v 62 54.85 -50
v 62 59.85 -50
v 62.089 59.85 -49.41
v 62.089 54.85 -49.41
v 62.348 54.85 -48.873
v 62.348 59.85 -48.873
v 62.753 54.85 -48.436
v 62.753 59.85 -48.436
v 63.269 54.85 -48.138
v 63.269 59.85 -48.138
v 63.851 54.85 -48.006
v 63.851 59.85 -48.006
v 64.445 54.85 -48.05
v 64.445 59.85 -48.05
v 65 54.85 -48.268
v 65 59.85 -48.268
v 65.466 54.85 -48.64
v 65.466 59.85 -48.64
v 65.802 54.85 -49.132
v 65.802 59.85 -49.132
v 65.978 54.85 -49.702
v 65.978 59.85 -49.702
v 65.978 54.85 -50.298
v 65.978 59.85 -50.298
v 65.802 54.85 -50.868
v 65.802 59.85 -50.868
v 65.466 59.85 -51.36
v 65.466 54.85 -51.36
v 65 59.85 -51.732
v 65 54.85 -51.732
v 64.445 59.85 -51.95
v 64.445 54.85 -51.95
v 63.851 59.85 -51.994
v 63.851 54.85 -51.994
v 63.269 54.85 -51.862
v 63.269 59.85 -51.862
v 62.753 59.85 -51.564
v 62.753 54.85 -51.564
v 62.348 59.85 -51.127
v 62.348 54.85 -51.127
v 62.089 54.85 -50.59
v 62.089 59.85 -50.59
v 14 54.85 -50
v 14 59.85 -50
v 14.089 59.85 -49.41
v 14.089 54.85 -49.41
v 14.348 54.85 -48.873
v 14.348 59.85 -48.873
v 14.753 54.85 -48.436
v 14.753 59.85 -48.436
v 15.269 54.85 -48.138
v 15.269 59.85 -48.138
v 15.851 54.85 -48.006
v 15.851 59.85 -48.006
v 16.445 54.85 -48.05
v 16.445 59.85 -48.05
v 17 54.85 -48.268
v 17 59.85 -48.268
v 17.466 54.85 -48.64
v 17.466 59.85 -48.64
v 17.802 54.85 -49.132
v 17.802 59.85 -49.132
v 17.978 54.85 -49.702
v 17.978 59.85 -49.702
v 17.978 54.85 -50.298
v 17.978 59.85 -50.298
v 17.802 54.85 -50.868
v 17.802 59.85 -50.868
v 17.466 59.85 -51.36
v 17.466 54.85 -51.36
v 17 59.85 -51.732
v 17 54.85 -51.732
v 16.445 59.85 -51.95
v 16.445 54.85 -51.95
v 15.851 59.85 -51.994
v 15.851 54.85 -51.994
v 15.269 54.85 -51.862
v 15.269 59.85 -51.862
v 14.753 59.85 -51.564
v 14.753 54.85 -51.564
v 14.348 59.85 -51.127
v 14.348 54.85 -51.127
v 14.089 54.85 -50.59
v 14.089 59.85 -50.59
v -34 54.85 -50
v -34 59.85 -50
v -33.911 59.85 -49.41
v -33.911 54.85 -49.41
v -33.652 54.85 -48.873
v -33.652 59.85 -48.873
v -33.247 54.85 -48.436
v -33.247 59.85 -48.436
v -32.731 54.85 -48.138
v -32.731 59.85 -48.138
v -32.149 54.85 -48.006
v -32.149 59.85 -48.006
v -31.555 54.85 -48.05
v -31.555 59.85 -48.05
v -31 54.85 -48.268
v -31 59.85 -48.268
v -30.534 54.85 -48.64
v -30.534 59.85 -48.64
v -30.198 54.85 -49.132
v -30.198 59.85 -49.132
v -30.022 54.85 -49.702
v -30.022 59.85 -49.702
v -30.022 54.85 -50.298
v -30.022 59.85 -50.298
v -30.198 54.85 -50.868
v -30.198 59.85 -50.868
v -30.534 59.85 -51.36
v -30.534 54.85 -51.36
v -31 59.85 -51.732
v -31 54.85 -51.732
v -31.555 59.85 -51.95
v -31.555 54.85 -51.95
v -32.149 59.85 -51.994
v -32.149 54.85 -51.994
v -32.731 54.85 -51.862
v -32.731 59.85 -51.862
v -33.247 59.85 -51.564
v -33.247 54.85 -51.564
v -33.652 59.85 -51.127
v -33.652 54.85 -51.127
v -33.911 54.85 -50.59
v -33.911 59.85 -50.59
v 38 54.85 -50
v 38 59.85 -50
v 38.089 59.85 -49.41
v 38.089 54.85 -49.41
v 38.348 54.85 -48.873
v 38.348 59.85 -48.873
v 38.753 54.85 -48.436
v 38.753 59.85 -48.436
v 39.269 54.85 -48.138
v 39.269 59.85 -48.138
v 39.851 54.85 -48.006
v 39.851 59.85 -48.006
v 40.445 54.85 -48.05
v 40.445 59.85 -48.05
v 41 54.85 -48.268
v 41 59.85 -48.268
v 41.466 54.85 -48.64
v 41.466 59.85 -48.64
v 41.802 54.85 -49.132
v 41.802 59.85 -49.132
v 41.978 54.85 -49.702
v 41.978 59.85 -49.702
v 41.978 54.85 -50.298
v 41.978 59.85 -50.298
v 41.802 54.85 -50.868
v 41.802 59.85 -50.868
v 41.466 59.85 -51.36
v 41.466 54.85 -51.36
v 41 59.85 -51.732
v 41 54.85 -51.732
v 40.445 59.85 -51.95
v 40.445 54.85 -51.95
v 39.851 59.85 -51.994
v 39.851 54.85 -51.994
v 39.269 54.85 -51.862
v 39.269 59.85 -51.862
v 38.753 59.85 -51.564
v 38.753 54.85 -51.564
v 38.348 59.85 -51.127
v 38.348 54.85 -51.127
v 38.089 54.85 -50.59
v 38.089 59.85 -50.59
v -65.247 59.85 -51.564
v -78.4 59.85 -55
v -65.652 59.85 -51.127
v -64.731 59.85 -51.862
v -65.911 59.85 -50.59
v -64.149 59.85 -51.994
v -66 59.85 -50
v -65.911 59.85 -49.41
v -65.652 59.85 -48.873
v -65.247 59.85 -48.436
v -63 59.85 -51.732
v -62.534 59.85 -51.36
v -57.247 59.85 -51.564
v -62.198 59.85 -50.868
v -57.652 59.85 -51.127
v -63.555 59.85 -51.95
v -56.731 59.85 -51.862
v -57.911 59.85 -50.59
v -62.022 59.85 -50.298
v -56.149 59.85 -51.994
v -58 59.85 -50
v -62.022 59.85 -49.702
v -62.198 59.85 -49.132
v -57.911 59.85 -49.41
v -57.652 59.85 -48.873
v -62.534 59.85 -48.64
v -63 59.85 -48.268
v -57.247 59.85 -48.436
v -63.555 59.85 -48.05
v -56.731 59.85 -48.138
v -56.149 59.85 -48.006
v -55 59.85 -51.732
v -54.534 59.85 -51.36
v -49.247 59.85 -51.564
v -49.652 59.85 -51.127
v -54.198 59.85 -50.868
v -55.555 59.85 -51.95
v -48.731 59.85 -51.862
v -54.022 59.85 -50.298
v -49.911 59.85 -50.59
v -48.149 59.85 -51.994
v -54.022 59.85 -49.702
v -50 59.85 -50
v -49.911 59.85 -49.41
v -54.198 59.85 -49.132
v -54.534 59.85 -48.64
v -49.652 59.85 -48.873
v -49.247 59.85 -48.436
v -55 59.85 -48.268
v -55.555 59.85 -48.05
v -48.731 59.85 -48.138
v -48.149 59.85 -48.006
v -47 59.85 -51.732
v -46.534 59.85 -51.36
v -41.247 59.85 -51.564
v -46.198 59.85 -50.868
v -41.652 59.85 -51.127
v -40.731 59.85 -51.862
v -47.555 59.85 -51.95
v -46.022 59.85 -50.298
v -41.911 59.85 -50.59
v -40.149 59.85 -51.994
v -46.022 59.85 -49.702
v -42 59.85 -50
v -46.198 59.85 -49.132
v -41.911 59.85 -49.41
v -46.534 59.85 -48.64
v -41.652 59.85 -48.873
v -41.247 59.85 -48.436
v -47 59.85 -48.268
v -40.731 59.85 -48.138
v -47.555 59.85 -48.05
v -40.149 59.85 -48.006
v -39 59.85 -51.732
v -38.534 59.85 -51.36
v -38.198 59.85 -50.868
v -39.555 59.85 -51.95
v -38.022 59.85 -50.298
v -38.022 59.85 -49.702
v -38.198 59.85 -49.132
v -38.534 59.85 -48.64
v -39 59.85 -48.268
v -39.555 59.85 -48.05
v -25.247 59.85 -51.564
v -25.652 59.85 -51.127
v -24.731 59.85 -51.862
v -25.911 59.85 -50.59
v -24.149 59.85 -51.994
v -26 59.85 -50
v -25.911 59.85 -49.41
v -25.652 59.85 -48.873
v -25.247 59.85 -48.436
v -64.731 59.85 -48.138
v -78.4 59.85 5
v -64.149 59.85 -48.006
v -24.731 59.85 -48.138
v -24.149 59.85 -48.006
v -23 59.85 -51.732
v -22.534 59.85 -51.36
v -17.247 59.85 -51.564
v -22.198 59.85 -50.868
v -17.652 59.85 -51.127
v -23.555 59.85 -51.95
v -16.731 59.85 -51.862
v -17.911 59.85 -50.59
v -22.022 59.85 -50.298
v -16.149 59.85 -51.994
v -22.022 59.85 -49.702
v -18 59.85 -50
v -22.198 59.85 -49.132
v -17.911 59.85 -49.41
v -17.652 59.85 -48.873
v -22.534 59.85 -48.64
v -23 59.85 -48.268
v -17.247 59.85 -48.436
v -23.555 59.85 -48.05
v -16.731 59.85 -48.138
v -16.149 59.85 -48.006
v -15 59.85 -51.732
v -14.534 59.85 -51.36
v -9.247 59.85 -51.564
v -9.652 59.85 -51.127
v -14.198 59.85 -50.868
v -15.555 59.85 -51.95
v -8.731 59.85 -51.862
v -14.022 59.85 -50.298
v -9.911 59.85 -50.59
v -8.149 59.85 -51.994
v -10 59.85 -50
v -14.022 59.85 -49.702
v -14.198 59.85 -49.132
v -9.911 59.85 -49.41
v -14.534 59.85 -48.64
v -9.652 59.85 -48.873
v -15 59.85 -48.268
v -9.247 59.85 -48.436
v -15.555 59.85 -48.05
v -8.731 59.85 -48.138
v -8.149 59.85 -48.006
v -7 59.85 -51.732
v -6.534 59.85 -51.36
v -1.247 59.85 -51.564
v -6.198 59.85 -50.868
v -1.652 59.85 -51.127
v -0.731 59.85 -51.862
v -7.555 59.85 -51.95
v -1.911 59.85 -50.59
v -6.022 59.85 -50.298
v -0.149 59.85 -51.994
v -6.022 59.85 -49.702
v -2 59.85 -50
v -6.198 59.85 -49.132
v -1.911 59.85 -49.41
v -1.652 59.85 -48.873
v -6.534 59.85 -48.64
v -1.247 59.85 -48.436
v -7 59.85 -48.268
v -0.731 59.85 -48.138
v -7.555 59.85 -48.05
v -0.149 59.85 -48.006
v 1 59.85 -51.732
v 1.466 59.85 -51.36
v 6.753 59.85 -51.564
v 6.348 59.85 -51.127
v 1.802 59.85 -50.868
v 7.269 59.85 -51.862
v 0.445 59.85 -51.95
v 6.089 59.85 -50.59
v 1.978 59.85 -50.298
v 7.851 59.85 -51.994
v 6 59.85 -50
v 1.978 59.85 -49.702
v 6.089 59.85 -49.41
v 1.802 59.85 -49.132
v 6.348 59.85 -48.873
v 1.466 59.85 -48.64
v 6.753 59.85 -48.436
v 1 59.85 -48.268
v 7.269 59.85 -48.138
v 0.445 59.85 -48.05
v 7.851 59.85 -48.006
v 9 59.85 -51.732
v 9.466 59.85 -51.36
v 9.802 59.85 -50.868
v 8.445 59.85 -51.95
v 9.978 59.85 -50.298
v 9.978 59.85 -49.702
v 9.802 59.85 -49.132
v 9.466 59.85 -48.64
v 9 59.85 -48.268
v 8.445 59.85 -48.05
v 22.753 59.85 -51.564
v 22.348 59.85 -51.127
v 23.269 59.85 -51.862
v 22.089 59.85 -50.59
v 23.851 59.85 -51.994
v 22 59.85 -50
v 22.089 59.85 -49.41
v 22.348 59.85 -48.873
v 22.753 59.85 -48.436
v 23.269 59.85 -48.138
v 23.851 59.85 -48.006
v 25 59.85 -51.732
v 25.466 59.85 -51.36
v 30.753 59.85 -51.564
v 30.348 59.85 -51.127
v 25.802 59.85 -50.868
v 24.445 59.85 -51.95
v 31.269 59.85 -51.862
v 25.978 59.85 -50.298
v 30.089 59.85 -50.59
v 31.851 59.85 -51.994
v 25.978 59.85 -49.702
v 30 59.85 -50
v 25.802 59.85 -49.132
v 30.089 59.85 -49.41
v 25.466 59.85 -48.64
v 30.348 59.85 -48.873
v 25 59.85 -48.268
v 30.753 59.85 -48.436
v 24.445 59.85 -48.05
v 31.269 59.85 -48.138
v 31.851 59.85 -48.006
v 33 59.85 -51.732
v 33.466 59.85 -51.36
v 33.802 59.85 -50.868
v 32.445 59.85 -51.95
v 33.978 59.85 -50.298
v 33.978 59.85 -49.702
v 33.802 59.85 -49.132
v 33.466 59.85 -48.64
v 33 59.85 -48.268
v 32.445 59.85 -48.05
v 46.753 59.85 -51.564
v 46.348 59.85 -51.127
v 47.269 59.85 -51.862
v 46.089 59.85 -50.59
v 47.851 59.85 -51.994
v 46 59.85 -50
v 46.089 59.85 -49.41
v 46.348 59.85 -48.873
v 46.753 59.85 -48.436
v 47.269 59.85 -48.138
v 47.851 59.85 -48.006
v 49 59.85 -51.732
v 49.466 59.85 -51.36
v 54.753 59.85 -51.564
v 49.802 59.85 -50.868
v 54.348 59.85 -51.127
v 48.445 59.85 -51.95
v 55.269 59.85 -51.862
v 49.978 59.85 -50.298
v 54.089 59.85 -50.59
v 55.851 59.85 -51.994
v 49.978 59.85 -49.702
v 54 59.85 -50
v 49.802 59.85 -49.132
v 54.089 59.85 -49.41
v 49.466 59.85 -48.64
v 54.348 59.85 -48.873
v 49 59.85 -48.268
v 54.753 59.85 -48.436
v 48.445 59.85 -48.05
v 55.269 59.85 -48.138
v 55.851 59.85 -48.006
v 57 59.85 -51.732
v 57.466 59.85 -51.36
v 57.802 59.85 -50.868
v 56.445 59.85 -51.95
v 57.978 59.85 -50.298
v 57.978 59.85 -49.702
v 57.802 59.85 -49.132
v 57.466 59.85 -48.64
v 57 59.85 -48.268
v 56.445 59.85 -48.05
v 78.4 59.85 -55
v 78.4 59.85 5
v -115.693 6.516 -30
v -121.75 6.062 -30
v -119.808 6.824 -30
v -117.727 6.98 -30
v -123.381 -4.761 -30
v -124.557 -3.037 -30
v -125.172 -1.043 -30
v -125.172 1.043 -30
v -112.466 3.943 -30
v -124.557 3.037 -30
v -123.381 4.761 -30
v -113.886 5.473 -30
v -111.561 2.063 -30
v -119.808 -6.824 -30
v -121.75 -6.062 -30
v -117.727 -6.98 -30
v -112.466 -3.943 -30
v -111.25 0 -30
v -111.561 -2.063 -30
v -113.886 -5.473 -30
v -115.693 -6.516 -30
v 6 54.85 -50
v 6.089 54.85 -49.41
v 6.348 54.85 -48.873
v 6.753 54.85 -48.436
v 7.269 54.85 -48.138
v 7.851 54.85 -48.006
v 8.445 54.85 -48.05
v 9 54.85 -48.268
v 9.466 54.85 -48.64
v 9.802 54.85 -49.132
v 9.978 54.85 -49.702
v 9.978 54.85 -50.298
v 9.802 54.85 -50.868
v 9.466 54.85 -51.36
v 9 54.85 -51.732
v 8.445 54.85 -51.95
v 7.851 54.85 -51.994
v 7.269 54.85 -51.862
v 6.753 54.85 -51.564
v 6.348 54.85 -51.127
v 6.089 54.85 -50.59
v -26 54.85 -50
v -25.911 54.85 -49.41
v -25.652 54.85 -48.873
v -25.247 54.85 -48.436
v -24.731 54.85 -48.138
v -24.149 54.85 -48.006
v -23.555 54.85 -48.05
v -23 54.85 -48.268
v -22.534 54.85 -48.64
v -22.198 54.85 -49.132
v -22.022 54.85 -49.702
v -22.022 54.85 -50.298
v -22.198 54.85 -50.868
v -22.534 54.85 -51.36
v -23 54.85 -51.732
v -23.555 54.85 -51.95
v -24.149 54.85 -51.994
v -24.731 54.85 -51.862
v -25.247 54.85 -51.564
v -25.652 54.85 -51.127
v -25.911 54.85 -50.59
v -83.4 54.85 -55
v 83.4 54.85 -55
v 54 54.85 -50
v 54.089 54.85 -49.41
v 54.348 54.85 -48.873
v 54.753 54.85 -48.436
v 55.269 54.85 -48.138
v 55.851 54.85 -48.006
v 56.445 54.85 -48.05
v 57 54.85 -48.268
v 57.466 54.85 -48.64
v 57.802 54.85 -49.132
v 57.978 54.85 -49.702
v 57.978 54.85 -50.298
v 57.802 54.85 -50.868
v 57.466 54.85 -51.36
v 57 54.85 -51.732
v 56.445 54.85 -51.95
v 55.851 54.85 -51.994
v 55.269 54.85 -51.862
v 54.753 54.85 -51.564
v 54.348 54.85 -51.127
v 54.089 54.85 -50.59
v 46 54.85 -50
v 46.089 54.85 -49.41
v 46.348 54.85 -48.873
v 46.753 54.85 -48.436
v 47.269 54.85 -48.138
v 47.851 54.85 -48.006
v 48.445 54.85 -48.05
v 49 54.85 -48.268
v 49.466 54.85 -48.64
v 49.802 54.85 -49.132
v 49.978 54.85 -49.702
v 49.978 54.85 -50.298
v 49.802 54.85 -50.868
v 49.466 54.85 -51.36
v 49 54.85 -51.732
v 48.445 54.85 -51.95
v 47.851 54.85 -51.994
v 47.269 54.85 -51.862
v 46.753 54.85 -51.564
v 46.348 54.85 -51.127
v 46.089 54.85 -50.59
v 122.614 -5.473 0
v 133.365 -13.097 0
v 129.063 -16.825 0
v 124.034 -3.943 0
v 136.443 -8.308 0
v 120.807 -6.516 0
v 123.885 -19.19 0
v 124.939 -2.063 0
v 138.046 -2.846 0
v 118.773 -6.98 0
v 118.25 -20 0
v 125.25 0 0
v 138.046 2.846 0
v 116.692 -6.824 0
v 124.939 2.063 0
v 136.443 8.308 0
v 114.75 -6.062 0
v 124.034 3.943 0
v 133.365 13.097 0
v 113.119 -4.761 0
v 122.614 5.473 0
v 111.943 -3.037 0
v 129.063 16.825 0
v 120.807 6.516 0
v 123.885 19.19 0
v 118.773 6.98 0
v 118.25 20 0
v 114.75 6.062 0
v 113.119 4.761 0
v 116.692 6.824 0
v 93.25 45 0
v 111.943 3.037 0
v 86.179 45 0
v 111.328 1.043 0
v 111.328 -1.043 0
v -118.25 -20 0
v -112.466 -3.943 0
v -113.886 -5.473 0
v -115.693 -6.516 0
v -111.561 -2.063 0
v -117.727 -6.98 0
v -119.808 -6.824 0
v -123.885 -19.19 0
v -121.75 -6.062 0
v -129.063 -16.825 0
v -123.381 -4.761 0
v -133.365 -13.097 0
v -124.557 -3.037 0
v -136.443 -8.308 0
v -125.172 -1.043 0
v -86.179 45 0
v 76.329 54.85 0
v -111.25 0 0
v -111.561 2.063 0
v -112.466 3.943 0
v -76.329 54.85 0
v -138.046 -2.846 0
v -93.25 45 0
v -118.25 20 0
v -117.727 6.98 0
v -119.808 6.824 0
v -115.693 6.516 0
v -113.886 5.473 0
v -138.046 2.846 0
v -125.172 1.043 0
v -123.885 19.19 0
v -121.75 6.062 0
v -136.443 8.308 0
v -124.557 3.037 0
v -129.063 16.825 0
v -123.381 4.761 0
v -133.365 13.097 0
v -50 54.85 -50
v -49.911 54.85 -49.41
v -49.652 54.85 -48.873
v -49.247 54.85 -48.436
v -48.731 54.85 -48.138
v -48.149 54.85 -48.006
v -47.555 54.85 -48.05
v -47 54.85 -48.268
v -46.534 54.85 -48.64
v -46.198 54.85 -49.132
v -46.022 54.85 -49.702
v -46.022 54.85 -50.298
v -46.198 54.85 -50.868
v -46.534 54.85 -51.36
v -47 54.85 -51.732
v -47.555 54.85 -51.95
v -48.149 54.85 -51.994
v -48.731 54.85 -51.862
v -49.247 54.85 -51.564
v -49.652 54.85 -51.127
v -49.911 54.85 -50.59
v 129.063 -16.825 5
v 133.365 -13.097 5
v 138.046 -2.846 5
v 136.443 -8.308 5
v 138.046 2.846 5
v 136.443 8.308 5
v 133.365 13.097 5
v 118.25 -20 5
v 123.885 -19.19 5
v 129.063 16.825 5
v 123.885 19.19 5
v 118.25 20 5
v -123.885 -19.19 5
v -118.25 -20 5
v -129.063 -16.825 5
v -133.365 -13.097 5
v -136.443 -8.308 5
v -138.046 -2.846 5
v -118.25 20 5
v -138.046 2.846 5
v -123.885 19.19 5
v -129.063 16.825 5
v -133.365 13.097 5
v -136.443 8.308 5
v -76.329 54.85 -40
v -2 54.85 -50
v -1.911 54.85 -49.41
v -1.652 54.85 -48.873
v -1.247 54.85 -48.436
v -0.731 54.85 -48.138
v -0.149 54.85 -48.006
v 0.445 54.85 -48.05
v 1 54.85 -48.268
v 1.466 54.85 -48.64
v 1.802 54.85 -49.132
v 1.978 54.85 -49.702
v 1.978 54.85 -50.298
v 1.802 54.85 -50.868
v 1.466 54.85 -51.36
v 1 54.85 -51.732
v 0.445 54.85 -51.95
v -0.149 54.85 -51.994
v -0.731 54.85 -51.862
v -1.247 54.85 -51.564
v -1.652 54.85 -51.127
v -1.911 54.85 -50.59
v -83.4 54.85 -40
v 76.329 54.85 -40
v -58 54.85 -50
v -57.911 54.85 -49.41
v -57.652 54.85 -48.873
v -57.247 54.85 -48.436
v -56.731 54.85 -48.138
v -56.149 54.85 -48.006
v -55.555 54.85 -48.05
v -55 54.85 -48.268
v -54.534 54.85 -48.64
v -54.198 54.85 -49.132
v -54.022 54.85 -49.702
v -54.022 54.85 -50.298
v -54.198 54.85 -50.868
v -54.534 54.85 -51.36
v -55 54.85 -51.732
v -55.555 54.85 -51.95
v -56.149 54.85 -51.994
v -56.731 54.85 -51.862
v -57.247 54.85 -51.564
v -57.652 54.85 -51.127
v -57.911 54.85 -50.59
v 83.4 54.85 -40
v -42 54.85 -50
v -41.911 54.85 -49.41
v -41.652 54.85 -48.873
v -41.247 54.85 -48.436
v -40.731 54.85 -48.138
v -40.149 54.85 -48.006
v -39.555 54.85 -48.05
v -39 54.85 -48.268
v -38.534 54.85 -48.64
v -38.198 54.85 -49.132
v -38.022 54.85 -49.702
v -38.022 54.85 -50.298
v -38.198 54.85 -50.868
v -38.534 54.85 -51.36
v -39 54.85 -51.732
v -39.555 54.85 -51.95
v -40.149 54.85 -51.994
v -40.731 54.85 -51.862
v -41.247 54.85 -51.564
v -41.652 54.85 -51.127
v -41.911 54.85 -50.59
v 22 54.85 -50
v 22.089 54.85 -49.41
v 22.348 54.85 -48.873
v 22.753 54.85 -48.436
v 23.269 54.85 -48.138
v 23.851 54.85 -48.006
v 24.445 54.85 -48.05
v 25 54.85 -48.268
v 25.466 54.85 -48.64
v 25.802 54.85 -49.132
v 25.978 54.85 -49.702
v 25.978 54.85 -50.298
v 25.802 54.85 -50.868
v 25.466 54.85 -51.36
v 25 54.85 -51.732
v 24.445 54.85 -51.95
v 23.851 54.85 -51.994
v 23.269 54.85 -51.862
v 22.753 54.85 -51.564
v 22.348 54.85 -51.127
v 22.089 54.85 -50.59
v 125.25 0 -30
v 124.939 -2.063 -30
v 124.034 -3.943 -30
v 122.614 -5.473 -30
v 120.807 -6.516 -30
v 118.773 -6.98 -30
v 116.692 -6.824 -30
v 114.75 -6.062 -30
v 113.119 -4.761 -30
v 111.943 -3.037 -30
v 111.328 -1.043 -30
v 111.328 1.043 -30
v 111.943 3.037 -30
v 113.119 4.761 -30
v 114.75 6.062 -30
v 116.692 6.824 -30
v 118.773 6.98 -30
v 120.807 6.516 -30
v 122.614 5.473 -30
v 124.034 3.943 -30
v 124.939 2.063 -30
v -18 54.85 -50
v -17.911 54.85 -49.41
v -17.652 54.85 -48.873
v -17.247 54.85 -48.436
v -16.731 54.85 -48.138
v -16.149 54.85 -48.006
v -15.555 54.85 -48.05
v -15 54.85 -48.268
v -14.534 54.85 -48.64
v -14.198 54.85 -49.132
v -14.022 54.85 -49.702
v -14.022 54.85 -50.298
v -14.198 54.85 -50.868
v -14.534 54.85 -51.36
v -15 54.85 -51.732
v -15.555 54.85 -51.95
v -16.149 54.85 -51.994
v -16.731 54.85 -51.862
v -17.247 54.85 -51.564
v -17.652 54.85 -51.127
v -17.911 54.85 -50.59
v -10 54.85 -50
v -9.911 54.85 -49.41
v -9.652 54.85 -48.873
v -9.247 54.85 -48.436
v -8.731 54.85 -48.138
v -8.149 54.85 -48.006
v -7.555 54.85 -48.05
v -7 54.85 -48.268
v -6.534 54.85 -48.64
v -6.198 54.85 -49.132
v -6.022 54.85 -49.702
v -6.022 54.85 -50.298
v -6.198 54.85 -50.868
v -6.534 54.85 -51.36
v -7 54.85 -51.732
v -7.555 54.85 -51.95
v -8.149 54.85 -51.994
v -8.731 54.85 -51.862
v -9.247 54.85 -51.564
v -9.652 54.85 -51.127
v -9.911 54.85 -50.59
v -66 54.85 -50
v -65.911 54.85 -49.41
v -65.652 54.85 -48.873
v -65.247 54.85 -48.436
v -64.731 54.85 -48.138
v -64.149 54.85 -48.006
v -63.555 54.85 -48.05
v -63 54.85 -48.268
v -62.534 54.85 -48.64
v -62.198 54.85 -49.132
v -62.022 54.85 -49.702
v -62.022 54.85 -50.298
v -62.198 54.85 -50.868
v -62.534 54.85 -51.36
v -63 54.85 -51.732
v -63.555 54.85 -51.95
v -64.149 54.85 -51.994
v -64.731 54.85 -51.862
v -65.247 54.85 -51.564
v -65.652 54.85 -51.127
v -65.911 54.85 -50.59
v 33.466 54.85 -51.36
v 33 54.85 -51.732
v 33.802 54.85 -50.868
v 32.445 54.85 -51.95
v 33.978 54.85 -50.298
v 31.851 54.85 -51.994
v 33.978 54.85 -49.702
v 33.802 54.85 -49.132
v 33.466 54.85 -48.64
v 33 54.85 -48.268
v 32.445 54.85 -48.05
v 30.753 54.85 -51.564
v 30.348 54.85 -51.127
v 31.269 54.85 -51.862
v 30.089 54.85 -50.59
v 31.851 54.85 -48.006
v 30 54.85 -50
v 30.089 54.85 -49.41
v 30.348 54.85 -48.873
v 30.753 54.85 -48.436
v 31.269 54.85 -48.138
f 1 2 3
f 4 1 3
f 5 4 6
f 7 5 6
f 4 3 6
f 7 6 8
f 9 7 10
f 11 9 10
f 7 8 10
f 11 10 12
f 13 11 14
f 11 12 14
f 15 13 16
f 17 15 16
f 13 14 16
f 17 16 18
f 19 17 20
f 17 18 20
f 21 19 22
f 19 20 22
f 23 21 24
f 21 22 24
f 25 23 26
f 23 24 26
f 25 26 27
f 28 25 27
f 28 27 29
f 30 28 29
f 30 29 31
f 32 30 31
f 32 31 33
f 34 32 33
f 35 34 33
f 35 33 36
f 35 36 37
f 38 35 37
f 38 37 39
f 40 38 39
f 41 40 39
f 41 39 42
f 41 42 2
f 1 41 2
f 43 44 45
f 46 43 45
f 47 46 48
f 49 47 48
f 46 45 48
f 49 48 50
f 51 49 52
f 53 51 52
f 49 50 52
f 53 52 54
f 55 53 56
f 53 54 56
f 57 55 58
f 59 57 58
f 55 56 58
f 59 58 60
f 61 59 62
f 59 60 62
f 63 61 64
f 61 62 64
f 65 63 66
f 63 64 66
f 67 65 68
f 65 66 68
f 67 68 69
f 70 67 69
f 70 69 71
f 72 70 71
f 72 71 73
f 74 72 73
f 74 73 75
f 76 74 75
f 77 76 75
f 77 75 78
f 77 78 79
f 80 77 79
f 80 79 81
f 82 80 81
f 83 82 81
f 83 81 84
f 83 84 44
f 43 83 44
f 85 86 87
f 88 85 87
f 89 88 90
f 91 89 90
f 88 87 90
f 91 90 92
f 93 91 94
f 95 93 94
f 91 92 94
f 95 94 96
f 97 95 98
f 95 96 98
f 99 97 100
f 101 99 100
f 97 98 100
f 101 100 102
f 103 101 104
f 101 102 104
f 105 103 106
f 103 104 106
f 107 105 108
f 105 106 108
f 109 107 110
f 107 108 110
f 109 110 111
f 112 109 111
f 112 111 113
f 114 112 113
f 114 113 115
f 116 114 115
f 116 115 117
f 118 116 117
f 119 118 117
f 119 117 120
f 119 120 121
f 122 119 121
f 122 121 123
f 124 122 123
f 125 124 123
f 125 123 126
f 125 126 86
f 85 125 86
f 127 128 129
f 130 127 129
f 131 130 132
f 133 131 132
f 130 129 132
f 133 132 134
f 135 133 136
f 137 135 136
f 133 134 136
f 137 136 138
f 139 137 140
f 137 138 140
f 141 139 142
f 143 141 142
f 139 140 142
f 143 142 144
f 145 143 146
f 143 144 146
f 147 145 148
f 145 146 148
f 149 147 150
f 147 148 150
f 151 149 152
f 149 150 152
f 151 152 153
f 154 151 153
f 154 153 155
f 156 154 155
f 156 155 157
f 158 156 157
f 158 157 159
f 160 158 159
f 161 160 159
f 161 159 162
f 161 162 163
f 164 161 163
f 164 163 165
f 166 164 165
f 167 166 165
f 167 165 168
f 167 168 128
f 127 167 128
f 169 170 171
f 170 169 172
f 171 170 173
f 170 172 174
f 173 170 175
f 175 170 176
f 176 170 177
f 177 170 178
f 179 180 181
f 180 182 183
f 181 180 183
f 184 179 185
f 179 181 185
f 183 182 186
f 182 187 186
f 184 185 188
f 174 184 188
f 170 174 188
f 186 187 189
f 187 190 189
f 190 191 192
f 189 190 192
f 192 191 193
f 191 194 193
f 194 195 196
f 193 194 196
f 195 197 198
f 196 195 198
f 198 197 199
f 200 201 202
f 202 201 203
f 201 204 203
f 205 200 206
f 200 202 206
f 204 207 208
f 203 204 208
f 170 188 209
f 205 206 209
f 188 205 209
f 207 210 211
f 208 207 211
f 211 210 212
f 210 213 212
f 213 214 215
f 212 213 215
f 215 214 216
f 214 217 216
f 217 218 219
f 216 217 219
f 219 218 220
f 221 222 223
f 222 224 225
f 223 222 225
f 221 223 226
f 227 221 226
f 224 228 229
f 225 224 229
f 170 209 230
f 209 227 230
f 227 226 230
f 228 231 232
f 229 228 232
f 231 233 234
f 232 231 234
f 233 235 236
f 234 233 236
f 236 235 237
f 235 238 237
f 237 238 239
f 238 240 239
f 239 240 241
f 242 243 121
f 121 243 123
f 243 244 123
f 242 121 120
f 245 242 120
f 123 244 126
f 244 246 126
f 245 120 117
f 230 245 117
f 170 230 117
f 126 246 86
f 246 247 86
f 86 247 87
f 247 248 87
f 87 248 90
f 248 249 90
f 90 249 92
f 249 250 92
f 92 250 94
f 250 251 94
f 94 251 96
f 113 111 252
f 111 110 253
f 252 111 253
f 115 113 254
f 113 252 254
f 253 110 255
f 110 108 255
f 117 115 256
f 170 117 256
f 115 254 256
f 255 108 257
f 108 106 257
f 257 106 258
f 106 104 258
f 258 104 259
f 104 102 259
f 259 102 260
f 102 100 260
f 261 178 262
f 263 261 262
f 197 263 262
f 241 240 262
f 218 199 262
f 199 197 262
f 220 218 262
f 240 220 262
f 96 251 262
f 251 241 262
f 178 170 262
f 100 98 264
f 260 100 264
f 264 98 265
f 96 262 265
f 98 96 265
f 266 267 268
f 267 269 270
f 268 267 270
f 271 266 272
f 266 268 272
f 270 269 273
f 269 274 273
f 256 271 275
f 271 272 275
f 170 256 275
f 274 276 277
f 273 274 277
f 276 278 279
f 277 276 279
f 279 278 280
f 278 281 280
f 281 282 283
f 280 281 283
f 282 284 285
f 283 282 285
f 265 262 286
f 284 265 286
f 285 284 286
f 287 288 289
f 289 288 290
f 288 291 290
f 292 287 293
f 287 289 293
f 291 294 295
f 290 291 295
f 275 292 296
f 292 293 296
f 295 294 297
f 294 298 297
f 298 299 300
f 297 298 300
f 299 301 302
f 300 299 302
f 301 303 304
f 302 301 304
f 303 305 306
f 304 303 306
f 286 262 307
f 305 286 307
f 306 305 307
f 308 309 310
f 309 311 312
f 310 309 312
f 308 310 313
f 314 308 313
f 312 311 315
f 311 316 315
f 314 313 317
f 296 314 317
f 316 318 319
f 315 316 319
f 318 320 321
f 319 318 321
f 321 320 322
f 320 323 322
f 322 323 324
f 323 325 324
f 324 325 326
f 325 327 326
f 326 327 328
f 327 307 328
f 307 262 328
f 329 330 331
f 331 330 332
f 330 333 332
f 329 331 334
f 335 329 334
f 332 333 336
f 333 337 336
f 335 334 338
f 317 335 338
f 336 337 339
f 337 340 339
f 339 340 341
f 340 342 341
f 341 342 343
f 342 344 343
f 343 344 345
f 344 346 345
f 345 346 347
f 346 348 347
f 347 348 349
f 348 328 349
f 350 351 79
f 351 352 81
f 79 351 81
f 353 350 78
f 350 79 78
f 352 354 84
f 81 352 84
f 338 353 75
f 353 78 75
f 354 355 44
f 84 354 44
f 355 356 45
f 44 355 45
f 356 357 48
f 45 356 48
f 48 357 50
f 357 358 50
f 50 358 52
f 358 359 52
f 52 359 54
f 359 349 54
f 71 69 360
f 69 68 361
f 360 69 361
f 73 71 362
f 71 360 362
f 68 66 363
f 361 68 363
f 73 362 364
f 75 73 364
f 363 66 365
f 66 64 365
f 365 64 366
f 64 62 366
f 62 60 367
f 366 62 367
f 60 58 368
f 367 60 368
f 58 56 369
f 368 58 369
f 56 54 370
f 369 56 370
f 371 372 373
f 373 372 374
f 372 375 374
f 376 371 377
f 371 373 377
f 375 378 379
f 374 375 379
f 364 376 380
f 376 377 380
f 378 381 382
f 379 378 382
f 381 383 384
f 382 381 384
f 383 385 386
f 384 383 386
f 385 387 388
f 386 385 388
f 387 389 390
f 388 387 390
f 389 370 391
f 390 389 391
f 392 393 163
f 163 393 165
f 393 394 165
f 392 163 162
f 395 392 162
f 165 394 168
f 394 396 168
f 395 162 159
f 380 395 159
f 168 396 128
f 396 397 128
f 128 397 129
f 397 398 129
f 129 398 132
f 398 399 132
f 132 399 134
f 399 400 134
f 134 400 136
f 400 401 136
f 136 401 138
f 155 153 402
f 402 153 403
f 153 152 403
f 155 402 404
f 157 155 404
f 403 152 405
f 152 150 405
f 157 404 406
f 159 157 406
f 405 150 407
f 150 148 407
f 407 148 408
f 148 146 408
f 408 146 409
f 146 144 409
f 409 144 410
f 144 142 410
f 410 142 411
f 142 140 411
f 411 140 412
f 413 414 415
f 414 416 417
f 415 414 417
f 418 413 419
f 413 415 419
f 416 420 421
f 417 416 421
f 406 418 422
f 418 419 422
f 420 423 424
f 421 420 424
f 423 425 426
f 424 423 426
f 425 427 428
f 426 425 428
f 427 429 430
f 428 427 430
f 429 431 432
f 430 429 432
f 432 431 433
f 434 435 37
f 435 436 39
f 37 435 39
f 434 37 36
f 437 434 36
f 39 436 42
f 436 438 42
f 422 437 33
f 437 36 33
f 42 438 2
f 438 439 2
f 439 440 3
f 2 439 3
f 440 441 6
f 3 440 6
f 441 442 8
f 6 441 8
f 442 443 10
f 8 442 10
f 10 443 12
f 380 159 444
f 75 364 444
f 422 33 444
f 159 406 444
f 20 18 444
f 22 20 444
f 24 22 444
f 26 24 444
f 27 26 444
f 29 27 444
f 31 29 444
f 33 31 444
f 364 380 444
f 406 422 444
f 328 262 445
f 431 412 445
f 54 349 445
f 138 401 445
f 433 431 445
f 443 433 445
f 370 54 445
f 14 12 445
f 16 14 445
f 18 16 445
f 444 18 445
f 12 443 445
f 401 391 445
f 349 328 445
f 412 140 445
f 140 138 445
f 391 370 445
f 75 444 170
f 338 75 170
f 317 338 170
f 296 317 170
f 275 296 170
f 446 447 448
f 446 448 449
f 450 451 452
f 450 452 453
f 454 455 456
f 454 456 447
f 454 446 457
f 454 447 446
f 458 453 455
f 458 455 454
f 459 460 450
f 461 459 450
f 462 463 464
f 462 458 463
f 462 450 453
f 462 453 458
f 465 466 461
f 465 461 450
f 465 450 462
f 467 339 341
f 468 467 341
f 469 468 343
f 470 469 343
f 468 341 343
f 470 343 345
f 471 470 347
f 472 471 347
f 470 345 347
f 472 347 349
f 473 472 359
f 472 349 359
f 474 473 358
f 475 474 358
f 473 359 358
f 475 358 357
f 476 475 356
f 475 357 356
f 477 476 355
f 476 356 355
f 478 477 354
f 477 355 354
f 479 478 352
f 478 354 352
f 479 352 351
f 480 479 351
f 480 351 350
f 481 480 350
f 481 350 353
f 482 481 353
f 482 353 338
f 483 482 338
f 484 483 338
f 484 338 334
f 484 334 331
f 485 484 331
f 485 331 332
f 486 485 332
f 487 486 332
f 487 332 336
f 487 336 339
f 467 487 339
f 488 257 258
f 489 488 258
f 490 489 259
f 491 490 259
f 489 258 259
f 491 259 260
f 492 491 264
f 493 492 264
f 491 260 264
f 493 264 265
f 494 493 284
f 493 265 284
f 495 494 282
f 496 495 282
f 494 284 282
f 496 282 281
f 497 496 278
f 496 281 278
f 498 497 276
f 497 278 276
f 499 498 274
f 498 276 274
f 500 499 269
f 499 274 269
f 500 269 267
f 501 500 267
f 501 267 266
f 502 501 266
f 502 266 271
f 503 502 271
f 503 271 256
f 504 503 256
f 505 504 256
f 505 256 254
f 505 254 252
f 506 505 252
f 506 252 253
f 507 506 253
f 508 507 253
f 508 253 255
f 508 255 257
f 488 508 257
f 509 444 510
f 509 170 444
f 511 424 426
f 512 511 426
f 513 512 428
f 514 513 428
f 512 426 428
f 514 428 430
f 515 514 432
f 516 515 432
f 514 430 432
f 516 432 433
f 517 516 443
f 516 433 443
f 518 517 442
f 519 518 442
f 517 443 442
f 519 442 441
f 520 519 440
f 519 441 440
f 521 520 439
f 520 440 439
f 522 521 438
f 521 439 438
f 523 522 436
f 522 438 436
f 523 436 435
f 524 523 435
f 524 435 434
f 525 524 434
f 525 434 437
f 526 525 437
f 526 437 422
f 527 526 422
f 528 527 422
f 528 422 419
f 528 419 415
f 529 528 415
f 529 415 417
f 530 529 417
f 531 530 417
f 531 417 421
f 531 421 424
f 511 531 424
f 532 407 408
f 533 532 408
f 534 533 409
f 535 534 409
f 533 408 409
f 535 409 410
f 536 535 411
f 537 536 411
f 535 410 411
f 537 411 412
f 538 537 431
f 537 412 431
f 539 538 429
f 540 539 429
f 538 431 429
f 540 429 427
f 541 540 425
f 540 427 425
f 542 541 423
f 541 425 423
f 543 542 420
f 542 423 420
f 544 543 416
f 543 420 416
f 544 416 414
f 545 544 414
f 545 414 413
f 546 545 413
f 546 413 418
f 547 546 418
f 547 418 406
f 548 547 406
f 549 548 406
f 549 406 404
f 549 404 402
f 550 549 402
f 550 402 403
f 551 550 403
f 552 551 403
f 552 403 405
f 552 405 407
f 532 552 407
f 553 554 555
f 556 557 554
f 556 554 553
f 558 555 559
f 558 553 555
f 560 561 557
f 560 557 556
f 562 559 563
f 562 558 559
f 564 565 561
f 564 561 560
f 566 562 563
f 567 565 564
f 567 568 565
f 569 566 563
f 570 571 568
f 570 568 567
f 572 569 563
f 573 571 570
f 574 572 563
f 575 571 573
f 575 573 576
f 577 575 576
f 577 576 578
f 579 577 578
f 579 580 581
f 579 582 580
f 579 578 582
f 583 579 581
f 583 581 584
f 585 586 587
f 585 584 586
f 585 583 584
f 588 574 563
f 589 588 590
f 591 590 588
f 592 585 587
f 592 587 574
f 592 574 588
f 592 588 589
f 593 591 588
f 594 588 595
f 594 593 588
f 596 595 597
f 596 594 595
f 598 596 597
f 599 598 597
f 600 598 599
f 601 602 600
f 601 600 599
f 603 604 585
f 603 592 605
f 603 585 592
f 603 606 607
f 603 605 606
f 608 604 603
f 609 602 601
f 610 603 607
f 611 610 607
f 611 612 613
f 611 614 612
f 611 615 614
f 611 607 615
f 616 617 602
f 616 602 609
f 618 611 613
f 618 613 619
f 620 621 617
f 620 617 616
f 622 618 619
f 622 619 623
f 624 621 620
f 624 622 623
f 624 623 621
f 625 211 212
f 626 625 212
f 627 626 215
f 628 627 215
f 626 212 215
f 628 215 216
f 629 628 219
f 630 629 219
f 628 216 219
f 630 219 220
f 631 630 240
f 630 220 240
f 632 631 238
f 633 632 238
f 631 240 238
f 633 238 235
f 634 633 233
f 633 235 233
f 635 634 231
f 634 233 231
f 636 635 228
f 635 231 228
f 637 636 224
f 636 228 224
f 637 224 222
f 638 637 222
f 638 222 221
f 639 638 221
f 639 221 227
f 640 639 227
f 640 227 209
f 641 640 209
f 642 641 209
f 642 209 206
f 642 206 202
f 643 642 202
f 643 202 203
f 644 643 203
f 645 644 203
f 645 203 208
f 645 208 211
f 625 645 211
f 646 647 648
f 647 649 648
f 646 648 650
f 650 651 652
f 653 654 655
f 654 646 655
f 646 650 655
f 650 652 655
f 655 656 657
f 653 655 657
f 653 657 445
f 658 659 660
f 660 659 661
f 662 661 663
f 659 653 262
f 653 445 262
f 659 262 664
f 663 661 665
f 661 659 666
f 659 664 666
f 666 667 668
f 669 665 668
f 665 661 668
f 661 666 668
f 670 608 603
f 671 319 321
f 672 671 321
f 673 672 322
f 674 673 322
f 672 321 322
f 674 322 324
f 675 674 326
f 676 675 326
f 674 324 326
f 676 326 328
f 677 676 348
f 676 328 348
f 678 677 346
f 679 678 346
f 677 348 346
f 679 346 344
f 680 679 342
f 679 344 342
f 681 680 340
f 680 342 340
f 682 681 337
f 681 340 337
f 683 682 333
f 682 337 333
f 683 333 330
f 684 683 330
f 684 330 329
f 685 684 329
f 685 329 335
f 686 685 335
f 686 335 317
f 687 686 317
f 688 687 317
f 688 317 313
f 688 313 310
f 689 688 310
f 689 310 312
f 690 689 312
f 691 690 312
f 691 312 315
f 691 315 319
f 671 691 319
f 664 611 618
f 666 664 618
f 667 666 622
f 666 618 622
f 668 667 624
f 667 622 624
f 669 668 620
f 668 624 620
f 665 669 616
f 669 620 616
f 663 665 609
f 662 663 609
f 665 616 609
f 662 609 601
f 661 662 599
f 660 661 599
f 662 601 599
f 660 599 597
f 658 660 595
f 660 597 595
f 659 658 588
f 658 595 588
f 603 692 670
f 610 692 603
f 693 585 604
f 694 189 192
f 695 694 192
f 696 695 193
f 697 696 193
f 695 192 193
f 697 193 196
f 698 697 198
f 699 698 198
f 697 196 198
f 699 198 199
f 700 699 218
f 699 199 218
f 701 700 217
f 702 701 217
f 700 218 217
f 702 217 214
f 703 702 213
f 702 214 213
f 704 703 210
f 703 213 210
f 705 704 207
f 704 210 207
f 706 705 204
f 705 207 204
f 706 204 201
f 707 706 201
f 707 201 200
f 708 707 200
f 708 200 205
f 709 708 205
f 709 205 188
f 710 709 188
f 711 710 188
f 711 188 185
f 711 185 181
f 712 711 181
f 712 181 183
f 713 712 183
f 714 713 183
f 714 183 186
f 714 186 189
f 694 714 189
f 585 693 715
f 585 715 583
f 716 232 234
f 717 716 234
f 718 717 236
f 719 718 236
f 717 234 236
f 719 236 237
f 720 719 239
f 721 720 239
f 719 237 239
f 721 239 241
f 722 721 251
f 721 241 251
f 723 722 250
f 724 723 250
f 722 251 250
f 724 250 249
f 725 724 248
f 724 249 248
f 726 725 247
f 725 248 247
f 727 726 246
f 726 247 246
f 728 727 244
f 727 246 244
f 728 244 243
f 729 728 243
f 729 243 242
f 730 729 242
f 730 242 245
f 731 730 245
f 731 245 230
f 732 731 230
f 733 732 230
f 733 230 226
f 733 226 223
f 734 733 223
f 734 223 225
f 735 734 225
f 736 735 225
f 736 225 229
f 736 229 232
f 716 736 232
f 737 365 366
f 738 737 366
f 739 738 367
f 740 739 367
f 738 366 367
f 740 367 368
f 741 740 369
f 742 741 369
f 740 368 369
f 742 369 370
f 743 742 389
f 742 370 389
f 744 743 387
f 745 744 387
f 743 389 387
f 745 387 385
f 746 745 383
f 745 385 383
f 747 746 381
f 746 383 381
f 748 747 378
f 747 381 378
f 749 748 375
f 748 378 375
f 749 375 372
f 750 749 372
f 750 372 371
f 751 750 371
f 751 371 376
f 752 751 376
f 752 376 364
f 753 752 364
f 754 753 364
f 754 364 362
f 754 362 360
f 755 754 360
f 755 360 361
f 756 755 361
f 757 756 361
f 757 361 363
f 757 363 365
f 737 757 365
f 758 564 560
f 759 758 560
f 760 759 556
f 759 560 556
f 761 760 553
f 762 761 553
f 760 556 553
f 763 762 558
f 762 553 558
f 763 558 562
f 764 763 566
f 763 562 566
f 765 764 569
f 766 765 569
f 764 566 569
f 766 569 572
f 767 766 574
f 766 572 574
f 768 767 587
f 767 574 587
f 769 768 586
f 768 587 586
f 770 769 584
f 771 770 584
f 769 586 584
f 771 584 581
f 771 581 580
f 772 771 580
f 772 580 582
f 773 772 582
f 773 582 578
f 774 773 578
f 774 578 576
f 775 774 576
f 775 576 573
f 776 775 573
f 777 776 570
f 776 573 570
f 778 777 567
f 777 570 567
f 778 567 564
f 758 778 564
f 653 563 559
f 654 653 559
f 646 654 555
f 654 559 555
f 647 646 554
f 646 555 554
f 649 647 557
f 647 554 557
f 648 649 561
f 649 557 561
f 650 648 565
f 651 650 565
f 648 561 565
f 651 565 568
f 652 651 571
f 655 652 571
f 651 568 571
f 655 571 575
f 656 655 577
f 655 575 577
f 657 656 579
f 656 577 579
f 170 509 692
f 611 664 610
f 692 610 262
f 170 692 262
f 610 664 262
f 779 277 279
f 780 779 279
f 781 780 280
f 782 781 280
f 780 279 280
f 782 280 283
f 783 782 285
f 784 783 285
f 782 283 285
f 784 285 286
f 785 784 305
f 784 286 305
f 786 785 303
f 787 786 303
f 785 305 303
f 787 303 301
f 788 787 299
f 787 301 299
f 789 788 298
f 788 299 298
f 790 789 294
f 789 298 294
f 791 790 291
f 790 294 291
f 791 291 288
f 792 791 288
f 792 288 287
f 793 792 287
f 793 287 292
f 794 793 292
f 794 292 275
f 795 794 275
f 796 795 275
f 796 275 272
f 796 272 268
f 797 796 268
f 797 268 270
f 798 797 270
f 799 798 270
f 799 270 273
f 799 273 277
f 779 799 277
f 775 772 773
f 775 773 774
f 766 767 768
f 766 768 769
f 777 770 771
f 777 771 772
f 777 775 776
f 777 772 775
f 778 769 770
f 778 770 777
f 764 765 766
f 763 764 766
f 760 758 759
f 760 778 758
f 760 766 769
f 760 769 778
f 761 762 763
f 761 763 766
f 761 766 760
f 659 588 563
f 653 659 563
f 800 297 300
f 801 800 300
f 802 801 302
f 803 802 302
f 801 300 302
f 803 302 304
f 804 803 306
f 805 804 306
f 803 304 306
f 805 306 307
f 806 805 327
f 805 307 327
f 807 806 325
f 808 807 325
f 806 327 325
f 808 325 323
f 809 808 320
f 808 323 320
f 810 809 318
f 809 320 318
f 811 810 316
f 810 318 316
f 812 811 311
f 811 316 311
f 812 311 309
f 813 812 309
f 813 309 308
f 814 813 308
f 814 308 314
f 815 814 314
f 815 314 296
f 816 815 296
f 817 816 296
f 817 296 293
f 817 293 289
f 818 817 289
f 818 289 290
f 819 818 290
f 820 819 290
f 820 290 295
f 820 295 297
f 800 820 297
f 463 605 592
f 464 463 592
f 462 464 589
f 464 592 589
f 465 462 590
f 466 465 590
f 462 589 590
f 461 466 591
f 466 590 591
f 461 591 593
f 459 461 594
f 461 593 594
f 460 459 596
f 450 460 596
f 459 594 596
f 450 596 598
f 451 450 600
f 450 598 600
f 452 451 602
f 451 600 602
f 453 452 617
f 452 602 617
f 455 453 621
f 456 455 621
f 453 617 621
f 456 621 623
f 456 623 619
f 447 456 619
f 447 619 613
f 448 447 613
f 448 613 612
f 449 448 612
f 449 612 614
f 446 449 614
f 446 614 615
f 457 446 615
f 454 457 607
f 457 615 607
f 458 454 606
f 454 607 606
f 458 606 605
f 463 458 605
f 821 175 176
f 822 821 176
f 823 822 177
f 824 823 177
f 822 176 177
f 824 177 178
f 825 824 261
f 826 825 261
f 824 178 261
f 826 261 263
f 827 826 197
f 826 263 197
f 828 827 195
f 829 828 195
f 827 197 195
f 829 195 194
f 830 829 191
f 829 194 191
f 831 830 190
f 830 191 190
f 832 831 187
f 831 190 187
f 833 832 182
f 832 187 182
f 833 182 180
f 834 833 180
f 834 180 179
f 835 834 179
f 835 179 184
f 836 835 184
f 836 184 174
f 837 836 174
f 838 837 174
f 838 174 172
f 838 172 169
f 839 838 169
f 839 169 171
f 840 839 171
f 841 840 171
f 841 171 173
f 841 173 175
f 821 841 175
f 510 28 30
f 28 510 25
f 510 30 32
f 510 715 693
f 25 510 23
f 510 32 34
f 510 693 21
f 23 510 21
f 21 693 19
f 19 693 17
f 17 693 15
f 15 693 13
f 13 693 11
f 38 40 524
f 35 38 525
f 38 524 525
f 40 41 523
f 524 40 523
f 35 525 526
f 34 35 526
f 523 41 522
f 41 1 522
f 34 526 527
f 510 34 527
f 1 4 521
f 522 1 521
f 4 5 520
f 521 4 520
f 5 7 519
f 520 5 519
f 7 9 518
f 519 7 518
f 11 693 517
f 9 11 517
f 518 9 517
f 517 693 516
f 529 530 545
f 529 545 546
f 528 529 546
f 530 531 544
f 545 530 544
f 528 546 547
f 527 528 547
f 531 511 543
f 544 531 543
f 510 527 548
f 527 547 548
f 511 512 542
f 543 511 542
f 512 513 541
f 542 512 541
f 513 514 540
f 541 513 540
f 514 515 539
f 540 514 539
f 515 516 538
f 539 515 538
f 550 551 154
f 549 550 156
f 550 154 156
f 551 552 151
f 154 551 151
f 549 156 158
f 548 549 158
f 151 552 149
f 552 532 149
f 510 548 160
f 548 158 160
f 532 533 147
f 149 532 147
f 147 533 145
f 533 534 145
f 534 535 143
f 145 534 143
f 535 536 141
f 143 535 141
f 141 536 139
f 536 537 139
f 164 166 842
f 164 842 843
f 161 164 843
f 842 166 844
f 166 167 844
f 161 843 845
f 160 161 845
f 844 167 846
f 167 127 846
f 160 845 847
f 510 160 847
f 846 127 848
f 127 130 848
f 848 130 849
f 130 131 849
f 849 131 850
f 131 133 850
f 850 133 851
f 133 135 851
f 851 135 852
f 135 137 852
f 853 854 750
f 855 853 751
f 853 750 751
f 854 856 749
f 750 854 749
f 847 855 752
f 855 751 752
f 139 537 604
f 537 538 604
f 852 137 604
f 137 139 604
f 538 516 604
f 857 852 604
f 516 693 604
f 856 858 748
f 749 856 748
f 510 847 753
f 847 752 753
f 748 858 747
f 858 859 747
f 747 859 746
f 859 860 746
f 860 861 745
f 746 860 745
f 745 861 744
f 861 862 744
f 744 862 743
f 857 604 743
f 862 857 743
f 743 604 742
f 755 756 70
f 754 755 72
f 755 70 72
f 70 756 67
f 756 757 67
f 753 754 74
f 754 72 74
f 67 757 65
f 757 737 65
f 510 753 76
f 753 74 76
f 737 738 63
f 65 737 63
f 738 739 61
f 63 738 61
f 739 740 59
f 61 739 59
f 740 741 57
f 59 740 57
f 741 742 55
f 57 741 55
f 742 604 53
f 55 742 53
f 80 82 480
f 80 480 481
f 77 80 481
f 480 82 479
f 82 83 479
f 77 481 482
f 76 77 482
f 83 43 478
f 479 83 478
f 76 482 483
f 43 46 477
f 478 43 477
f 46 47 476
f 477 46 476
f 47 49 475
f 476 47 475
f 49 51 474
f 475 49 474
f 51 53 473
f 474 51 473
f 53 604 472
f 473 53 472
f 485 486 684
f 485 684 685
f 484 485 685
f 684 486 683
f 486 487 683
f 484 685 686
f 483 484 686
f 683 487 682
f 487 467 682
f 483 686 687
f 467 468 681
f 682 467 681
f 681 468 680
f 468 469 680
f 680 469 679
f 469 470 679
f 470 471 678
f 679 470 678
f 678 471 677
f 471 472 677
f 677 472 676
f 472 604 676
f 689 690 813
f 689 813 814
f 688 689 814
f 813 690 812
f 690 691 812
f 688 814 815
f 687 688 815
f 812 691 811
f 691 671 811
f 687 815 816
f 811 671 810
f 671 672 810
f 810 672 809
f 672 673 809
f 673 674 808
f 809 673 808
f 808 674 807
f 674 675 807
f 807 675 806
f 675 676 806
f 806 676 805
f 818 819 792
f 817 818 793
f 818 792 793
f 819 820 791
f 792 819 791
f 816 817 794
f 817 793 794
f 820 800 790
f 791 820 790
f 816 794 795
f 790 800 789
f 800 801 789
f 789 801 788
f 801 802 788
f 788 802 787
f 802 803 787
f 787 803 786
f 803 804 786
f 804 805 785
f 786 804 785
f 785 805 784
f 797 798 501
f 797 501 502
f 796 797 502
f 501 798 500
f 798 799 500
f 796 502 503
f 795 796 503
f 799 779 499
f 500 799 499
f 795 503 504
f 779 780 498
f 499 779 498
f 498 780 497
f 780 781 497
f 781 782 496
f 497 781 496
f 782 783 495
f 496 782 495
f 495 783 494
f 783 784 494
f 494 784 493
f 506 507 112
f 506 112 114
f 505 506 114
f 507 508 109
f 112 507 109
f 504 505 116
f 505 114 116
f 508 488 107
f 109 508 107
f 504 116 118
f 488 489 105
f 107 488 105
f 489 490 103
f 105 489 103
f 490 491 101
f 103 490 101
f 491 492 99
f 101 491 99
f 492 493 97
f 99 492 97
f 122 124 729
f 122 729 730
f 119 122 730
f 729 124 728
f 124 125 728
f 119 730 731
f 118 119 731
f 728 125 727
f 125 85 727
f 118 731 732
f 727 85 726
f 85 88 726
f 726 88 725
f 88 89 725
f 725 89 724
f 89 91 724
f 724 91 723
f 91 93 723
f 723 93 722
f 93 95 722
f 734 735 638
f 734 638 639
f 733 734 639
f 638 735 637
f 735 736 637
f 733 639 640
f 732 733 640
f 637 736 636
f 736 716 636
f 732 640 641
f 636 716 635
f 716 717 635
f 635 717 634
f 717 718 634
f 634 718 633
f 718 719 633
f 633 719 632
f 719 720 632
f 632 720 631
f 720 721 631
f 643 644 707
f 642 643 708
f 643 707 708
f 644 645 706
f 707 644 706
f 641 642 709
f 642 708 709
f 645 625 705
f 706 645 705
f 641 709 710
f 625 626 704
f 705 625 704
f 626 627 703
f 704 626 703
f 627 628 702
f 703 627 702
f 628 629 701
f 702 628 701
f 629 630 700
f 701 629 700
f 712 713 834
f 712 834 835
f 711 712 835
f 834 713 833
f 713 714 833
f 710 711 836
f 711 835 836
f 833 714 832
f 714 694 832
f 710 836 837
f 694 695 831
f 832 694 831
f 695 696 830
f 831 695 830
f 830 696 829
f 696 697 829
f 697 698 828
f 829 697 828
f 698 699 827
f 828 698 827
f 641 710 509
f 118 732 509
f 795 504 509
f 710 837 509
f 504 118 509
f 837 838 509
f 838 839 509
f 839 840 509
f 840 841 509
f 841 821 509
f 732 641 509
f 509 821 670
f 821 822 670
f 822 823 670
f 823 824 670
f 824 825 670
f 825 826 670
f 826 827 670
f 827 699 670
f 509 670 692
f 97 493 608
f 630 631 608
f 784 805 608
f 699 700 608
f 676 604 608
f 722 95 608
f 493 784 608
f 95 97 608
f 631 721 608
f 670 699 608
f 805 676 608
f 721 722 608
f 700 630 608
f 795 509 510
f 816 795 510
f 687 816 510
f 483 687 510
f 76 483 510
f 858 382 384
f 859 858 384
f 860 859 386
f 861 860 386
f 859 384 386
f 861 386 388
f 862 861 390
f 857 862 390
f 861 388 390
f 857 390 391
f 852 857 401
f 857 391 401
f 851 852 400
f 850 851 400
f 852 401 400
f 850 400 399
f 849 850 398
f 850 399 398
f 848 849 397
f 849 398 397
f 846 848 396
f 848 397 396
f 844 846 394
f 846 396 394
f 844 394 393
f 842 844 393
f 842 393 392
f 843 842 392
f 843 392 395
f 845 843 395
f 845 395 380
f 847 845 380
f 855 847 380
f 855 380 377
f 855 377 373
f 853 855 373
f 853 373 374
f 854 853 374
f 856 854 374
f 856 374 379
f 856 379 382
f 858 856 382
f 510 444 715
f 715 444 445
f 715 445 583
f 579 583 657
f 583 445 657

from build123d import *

# Parameters (mm, degrees)
EXTRUDE_1_DEPTH          = 5
SKETCH_2_R               = 7
EXTRUDE_2_DEPTH          = 30
EXTRUDE_3_DEPTH          = 5
EXTRUDE_4_DEPTH          = 55
SKETCH_5_R               = 2
CUT_EXTRUDE_1_DEPTH      = 169.861141178
EXTRUDE_5_DEPTH          = 40
CUT_EXTRUDE_2_DEPTH      = 161.374826578
CUT_EXTRUDE_2_DEPTH_BACK = 161.374826578


with BuildPart() as part:
    # Эскиз1 → Бобышка-Вытянуть1 (new body)
    with BuildSketch(Plane.XY):
        with BuildLine():
            Line((-118.25, -20), (118.25, -20))
            ThreePointArc((118.25, -20), (138.25, 0), (118.25, 20))
            Line((118.25, 20), (-118.25, 20))
            ThreePointArc((-118.25, 20), (-138.25, 0), (-118.25, -20))
        make_face()
    extrude(amount=EXTRUDE_1_DEPTH)

    # Эскиз2 → Бобышка-Вытянуть2 (add)
    with BuildSketch(Plane(origin=(0, 0, 0), x_dir=(-1, 0, 0), z_dir=(0, 0, -1))):
        with Locations(Location((-118.25, 0, 0), (0, 0, 180))):
            Circle(SKETCH_2_R)
        with Locations(Location((118.25, 0, 0), (0, 0, 180))):
            Circle(SKETCH_2_R)
    extrude(amount=EXTRUDE_2_DEPTH)

    # Эскиз3 → Бобышка-Вытянуть3 (add)
    with BuildSketch(Plane.XY.offset(5)):
        Polygon((-118.25, 20), (-78.4, 59.85), (78.4, 59.85), (118.25, 20), align=None)
    extrude(amount=-EXTRUDE_3_DEPTH)

    # Эскиз4 → Бобышка-Вытянуть4 (add)
    with BuildSketch(Plane(origin=(0, 0, 0), x_dir=(-1, 0, 0), z_dir=(0, 0, -1))):
        Polygon((-78.4, 59.85), (-83.4, 54.85), (83.4, 54.85), (78.4, 59.85), align=None)
    extrude(amount=EXTRUDE_4_DEPTH)

    # Эскиз5 → Вырез-Вытянуть1 (cut, through all)
    with BuildSketch(Plane(origin=(0, 59.85, 0), x_dir=(1, 0, 0), z_dir=(0, 1, 0))):
        with Locations(Location((0, 50, 0), (0, 0, 180))):
            Circle(SKETCH_5_R)
        with Locations(Location((8, 50, 0), (0, 0, 180))):
            Circle(SKETCH_5_R)
        with Locations(Location((16, 50, 0), (0, 0, 180))):
            Circle(SKETCH_5_R)
        with Locations(Location((24, 50, 0), (0, 0, 180))):
            Circle(SKETCH_5_R)
        with Locations(Location((32, 50, 0), (0, 0, 180))):
            Circle(SKETCH_5_R)
        with Locations(Location((40, 50, 0), (0, 0, 180))):
            Circle(SKETCH_5_R)
        with Locations(Location((48, 50, 0), (0, 0, 180))):
            Circle(SKETCH_5_R)
        with Locations(Location((56, 50, 0), (0, 0, 180))):
            Circle(SKETCH_5_R)
        with Locations(Location((64, 50, 0), (0, 0, 180))):
            Circle(SKETCH_5_R)
        with Locations(Location((-8, 50, 0), (0, 0, 180))):
            Circle(SKETCH_5_R)
        with Locations(Location((-16, 50, 0), (0, 0, 180))):
            Circle(SKETCH_5_R)
        with Locations(Location((-24, 50, 0), (0, 0, 180))):
            Circle(SKETCH_5_R)
        with Locations(Location((-32, 50, 0), (0, 0, 180))):
            Circle(SKETCH_5_R)
        with Locations(Location((-40, 50, 0), (0, 0, 180))):
            Circle(SKETCH_5_R)
        with Locations(Location((-48, 50, 0), (0, 0, 180))):
            Circle(SKETCH_5_R)
        with Locations(Location((-56, 50, 0), (0, 0, 180))):
            Circle(SKETCH_5_R)
        with Locations(Location((-64, 50, 0), (0, 0, 180))):
            Circle(SKETCH_5_R)
    extrude(amount=-CUT_EXTRUDE_1_DEPTH, mode=Mode.SUBTRACT)

    # Эскиз7 → Бобышка-Вытянуть5 (add)
    with BuildSketch(Plane(origin=(0, 0, 0), x_dir=(-1, 0, 0), z_dir=(0, 0, -1))):
        Polygon((-118.25, 20), (-111.178932188, 20), (-76.04842613, 55.130506058), (-83.4, 54.85), align=None)
        Polygon((83.4, 54.85), (76.328932188, 54.85), (111.178932188, 20), (118.25, 20), align=None)
    extrude(amount=EXTRUDE_5_DEPTH)

    # Эскиз10 → Вырез-Вытянуть2 (cut, two sides: drawn at the far end of the back side and taken through both)
    with BuildSketch(Plane(origin=(0, 0, 0), x_dir=(0, 0, -1), z_dir=(1, 0, 0)).offset(-CUT_EXTRUDE_2_DEPTH_BACK)):
        Polygon((0, 20), (40, 20), (40, 54.85), (0, 45), align=None)
    extrude(amount=CUT_EXTRUDE_2_DEPTH + CUT_EXTRUDE_2_DEPTH_BACK, mode=Mode.SUBTRACT)


solid = part.part
